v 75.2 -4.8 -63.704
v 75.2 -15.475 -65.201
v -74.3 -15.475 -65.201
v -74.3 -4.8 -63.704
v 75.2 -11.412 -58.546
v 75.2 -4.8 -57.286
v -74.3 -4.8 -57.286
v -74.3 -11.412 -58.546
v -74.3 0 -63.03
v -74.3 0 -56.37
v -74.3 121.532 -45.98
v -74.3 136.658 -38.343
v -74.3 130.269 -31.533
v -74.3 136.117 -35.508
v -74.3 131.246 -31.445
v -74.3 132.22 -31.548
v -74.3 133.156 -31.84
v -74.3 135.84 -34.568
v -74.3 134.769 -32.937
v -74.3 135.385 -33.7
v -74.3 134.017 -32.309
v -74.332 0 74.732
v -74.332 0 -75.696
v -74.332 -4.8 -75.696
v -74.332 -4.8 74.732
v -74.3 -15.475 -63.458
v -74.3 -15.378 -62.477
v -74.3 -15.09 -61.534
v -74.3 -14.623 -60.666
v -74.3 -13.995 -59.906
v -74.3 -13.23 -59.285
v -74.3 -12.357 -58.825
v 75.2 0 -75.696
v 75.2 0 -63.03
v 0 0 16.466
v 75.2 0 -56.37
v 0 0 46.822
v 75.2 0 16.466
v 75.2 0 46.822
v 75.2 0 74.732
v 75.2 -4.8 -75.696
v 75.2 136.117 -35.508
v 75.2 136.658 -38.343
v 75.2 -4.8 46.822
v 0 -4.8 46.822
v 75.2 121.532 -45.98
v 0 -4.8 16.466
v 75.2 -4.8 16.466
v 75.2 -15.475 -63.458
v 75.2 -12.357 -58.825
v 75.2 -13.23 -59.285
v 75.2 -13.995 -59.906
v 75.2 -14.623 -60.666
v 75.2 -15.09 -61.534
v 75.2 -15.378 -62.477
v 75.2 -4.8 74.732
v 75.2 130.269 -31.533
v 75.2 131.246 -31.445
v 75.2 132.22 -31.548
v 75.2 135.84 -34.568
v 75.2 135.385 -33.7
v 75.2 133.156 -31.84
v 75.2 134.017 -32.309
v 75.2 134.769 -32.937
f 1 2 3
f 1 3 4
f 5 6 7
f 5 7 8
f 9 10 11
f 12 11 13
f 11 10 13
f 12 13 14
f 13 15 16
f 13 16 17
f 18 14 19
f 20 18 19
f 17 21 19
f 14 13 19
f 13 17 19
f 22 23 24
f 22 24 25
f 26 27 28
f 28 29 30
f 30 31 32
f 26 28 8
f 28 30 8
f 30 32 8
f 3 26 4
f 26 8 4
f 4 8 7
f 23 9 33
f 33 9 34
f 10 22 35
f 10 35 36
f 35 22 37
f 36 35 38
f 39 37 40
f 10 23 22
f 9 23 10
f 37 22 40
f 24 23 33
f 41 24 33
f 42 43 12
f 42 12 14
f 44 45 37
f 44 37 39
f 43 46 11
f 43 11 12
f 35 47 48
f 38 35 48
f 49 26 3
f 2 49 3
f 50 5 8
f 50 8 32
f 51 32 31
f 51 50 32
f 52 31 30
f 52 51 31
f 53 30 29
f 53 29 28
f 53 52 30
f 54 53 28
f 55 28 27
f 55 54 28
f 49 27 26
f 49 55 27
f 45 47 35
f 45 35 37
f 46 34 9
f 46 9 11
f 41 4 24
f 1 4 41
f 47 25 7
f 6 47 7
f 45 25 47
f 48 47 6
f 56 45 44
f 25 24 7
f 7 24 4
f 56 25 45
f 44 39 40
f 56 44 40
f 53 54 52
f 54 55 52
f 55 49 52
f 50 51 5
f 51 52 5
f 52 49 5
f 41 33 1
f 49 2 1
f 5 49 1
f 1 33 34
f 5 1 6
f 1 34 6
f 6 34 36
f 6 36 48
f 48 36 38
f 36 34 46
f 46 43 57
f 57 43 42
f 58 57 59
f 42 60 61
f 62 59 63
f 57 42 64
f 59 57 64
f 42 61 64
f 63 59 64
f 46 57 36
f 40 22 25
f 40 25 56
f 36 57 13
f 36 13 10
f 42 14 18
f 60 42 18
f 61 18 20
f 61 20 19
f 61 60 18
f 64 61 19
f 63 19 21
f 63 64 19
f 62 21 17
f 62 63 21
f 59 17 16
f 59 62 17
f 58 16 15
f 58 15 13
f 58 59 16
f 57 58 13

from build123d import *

# Parameters (mm, degrees)
F0_W     = 149.531708
F0_H     = 150.427163
F1_DEPTH = 4.8
F2_W     = 75.19953
F2_H     = 30.355446
F3_DEPTH = 33
F5_DEPTH = 149.5


with BuildPart() as f1:
    # F0 (on Front) → F1 (new body)
    with BuildSketch(Plane.XZ):
        with Locations((0.433676, -0.481956)):
            Rectangle(F0_W, F0_H)
    extrude(amount=F1_DEPTH)

    # F2 (on face) → F3 (cut)
    with BuildSketch(Plane.XZ.offset(4.8)):
        with Locations((37.599765, 31.643964)):
            Rectangle(F2_W, F2_H)
    extrude(amount=-F3_DEPTH, mode=Mode.SUBTRACT)

    # F4 (on face) → F5 (join)
    with BuildSketch(Plane.YZ.offset(75.19953)):
        with BuildLine():
            Line((0, -56.370427), (0, -63.030267))
            Line((0, -63.030267), (121.53174, -45.979694))
            Line((121.53174, -45.979694), (136.657913, -38.343303))
            Line((136.657913, -38.343303), (136.117308, -35.507916))
            ThreePointArc((136.117308, -35.507916), (134.016588, -32.309223), (130.269337, -31.53284))
            Line((130.269337, -31.53284), (0, -56.370427))
        make_face()
        with BuildLine():
            Line((-15.475349, -63.457762), (-15.475349, -65.201417))
            Line((-15.475349, -65.201417), (-4.8, -63.703694))
            Line((-4.8, -63.703694), (-4.8, -57.285611))
            Line((-4.8, -57.285611), (-11.411796, -58.546238))
            ThreePointArc((-11.411796, -58.546238), (-14.327766, -60.270462), (-15.475349, -63.457762))
        make_face()
    extrude(amount=-F5_DEPTH)


solid = f1.part
